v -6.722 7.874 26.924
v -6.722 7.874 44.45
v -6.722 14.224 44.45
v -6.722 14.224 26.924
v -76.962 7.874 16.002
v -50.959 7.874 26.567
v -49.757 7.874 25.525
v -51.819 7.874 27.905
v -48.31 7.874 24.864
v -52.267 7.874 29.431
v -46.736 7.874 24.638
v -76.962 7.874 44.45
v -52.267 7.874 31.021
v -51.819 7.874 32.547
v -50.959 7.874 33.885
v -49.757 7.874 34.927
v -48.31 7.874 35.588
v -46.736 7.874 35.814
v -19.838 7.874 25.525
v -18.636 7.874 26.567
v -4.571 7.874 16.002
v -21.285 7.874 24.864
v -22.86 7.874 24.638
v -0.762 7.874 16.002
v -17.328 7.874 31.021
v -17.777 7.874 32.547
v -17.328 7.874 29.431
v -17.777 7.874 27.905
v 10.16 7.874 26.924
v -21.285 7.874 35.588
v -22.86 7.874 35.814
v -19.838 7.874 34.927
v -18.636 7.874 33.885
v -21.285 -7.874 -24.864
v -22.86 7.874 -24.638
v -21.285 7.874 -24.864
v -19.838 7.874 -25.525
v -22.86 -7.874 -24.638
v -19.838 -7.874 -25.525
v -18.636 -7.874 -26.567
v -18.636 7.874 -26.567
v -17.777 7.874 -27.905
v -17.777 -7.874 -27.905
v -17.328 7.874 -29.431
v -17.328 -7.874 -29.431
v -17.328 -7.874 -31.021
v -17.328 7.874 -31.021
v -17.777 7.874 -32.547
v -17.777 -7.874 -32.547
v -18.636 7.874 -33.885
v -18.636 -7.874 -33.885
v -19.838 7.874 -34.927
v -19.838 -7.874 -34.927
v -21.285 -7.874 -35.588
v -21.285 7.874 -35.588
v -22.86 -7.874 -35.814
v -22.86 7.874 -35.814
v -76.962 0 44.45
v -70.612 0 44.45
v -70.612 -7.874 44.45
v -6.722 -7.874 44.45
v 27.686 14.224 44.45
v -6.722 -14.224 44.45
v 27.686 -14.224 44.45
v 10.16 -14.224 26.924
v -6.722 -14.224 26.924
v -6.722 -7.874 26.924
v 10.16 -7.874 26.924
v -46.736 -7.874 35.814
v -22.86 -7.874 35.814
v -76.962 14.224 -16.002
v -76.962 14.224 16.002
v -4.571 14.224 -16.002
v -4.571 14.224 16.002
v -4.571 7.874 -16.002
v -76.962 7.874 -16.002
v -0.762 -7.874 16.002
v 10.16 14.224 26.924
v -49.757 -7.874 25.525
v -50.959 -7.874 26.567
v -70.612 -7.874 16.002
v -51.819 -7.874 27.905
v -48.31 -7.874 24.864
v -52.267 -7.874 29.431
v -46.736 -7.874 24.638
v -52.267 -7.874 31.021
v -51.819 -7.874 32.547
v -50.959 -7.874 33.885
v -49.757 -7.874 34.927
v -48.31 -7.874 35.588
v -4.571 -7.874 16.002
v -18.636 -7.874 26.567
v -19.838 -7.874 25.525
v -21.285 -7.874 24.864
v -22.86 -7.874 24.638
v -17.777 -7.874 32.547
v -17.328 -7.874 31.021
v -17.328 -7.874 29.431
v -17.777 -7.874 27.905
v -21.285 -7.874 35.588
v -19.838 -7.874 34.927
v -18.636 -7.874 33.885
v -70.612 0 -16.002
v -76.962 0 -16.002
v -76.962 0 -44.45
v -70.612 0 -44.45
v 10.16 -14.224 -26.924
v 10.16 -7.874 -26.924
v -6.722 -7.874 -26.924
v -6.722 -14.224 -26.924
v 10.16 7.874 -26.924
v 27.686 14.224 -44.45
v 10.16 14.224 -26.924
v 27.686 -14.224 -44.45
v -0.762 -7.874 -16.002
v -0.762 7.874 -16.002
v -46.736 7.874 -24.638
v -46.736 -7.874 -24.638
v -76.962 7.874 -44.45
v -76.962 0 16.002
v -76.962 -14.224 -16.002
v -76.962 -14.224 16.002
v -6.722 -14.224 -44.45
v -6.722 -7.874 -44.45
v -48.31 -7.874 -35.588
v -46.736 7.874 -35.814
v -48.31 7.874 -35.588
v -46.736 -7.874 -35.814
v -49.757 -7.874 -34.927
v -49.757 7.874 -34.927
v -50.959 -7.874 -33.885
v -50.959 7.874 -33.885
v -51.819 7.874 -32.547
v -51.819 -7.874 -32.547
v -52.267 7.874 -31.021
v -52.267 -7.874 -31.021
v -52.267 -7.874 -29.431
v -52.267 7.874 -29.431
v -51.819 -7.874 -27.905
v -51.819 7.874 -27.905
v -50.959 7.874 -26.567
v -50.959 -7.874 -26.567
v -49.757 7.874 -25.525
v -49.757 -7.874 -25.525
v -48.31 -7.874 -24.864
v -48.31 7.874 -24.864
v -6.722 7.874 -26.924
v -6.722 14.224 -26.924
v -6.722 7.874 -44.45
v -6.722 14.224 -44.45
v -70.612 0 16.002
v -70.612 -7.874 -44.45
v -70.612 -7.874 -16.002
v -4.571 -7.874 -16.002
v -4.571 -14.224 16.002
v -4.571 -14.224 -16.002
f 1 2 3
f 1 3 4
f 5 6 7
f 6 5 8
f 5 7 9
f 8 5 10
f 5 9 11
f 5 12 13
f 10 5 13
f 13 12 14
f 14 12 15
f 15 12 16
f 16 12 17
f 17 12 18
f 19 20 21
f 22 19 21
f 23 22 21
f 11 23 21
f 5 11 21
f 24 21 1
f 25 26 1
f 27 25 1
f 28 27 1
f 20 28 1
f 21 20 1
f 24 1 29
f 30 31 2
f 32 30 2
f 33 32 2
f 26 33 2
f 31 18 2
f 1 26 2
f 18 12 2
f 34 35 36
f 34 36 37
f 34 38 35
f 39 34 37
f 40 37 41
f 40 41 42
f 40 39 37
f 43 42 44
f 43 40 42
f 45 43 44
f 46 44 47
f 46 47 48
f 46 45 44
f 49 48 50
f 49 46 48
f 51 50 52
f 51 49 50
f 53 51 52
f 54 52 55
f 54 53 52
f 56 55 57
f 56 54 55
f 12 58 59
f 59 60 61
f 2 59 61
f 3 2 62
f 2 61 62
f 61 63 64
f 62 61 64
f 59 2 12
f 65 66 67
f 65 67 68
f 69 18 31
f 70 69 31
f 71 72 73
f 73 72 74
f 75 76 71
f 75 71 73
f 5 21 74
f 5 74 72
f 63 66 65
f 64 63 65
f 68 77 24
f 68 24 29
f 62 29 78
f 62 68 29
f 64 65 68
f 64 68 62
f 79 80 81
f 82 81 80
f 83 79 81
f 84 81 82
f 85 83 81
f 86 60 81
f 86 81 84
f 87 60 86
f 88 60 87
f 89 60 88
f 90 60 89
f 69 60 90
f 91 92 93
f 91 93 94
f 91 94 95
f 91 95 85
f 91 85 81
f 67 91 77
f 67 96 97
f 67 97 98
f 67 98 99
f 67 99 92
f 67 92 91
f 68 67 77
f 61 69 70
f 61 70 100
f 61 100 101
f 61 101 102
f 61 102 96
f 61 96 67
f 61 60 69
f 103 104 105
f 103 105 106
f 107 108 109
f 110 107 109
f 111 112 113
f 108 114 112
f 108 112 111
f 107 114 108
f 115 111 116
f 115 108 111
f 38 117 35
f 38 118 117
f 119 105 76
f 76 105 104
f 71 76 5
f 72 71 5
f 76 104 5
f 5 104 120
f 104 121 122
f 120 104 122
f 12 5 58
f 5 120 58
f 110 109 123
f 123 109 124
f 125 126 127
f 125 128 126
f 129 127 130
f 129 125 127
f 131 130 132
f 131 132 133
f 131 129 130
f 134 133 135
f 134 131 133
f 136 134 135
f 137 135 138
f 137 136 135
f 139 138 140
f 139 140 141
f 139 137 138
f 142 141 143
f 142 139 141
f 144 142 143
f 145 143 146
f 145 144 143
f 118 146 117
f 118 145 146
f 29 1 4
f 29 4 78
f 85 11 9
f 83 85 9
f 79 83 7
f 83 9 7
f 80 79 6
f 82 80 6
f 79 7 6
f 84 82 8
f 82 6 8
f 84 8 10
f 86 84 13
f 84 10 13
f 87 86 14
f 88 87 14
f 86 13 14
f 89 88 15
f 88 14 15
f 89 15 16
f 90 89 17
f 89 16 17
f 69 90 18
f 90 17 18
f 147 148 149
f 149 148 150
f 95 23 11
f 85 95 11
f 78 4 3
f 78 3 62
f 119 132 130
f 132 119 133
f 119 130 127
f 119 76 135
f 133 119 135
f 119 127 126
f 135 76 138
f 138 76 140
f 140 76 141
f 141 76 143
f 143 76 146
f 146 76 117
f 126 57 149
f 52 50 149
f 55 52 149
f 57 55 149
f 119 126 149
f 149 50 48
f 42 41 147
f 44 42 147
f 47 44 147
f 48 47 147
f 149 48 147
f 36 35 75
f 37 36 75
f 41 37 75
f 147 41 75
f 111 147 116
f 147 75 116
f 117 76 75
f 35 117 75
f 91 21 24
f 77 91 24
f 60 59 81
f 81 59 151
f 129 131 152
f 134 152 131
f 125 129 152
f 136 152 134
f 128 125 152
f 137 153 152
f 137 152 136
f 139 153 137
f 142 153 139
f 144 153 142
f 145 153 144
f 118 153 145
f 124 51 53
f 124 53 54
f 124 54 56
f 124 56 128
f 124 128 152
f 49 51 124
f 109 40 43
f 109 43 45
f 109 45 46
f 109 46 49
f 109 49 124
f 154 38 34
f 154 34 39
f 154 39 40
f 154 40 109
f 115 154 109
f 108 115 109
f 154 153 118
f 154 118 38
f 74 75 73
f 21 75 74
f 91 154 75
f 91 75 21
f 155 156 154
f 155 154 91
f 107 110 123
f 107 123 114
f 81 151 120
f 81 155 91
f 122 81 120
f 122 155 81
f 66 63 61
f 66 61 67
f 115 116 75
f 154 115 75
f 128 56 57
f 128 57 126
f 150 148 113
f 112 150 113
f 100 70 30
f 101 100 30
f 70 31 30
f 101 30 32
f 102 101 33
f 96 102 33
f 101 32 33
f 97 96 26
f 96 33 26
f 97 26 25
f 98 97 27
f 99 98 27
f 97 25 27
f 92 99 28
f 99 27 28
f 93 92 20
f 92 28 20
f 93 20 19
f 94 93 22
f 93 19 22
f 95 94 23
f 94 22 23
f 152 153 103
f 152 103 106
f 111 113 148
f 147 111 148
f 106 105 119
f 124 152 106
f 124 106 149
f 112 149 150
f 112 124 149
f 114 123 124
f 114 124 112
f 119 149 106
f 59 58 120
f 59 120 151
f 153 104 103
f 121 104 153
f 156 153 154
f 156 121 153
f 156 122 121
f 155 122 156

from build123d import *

# Parameters (mm, degrees)
F1_DEPTH = 14.224
F2_DEPTH = 7.874
F3_DEPTH = 14.224
F0_W     = 6.35
F0_H     = 28.448
F4_DEPTH = 7.874


with BuildPart() as f1:
    # F0 (on Front) → F1 (new body, symmetric)
    with BuildSketch(Plane.XZ):
        Polygon((-4.571382422, -16.002), (-4.571382422, 16.002), (-70.6115919133, 16.002), (-76.9615919133, 16.002), (-76.9615919133, -16.002), (-70.6115919133, -16.002), align=None)
    extrude(amount=F1_DEPTH, both=True)

    # F0 (on Front) → F2 (join, symmetric)
    with BuildSketch(Plane.XZ):
        Polygon((-4.571382422, 16.002), (-0.7615919133, 16.002), (10.1604080867, 26.924), (-6.7215473391, 26.924), (-6.7215473391, 44.45), (-70.6115919133, 44.45), (-70.6115919133, 16.002), align=None)
        with BuildLine():
            ThreePointArc((-22.8595919133, 35.814), (-17.2715919133, 30.226), (-22.8595919133, 24.638))
            Line((-22.8595919133, 24.638), (-46.7355919133, 24.638))
            ThreePointArc((-46.7355919133, 24.638), (-52.3235919133, 30.226), (-46.7355919133, 35.814))
            Line((-46.7355919133, 35.814), (-22.8595919133, 35.814))
        make_face(mode=Mode.SUBTRACT)
        Polygon((-0.7615919133, -16.002), (-4.571382422, -16.002), (-70.6115919133, -16.002), (-70.6115919133, -44.45), (-6.7215473391, -44.45), (-6.7215473391, -26.924), (10.1604080867, -26.924), align=None)
        with BuildLine():
            Line((-22.8595919133, -35.814), (-46.7355919133, -35.814))
            ThreePointArc((-46.7355919133, -35.814), (-52.3235919133, -30.226), (-46.7355919133, -24.638))
            Line((-46.7355919133, -24.638), (-22.8595919133, -24.638))
            ThreePointArc((-22.8595919133, -24.638), (-17.2715919133, -30.226), (-22.8595919133, -35.814))
        make_face(mode=Mode.SUBTRACT)
    extrude(amount=F2_DEPTH, both=True)

    # F0 (on Front) → F3 (join, symmetric)
    with BuildSketch(Plane.XZ):
        Polygon((27.6864080867, -44.45), (10.1604080867, -26.924), (-6.7215473391, -26.924), (-6.7215473391, -44.45), align=None)
        Polygon((-6.7215473391, 26.924), (10.1604080867, 26.924), (27.6864080867, 44.45), (-6.7215473391, 44.45), align=None)
    extrude(amount=F3_DEPTH, both=True)

    # F0 (on Front) → F4 (join)
    with BuildSketch(Plane.XZ):
        with Locations((-73.7865919133, 30.226)):
            Rectangle(F0_W, F0_H)
        with Locations((-73.7865919133, -30.226)):
            Rectangle(F0_W, F0_H)
    extrude(amount=-F4_DEPTH)


solid = f1.part
